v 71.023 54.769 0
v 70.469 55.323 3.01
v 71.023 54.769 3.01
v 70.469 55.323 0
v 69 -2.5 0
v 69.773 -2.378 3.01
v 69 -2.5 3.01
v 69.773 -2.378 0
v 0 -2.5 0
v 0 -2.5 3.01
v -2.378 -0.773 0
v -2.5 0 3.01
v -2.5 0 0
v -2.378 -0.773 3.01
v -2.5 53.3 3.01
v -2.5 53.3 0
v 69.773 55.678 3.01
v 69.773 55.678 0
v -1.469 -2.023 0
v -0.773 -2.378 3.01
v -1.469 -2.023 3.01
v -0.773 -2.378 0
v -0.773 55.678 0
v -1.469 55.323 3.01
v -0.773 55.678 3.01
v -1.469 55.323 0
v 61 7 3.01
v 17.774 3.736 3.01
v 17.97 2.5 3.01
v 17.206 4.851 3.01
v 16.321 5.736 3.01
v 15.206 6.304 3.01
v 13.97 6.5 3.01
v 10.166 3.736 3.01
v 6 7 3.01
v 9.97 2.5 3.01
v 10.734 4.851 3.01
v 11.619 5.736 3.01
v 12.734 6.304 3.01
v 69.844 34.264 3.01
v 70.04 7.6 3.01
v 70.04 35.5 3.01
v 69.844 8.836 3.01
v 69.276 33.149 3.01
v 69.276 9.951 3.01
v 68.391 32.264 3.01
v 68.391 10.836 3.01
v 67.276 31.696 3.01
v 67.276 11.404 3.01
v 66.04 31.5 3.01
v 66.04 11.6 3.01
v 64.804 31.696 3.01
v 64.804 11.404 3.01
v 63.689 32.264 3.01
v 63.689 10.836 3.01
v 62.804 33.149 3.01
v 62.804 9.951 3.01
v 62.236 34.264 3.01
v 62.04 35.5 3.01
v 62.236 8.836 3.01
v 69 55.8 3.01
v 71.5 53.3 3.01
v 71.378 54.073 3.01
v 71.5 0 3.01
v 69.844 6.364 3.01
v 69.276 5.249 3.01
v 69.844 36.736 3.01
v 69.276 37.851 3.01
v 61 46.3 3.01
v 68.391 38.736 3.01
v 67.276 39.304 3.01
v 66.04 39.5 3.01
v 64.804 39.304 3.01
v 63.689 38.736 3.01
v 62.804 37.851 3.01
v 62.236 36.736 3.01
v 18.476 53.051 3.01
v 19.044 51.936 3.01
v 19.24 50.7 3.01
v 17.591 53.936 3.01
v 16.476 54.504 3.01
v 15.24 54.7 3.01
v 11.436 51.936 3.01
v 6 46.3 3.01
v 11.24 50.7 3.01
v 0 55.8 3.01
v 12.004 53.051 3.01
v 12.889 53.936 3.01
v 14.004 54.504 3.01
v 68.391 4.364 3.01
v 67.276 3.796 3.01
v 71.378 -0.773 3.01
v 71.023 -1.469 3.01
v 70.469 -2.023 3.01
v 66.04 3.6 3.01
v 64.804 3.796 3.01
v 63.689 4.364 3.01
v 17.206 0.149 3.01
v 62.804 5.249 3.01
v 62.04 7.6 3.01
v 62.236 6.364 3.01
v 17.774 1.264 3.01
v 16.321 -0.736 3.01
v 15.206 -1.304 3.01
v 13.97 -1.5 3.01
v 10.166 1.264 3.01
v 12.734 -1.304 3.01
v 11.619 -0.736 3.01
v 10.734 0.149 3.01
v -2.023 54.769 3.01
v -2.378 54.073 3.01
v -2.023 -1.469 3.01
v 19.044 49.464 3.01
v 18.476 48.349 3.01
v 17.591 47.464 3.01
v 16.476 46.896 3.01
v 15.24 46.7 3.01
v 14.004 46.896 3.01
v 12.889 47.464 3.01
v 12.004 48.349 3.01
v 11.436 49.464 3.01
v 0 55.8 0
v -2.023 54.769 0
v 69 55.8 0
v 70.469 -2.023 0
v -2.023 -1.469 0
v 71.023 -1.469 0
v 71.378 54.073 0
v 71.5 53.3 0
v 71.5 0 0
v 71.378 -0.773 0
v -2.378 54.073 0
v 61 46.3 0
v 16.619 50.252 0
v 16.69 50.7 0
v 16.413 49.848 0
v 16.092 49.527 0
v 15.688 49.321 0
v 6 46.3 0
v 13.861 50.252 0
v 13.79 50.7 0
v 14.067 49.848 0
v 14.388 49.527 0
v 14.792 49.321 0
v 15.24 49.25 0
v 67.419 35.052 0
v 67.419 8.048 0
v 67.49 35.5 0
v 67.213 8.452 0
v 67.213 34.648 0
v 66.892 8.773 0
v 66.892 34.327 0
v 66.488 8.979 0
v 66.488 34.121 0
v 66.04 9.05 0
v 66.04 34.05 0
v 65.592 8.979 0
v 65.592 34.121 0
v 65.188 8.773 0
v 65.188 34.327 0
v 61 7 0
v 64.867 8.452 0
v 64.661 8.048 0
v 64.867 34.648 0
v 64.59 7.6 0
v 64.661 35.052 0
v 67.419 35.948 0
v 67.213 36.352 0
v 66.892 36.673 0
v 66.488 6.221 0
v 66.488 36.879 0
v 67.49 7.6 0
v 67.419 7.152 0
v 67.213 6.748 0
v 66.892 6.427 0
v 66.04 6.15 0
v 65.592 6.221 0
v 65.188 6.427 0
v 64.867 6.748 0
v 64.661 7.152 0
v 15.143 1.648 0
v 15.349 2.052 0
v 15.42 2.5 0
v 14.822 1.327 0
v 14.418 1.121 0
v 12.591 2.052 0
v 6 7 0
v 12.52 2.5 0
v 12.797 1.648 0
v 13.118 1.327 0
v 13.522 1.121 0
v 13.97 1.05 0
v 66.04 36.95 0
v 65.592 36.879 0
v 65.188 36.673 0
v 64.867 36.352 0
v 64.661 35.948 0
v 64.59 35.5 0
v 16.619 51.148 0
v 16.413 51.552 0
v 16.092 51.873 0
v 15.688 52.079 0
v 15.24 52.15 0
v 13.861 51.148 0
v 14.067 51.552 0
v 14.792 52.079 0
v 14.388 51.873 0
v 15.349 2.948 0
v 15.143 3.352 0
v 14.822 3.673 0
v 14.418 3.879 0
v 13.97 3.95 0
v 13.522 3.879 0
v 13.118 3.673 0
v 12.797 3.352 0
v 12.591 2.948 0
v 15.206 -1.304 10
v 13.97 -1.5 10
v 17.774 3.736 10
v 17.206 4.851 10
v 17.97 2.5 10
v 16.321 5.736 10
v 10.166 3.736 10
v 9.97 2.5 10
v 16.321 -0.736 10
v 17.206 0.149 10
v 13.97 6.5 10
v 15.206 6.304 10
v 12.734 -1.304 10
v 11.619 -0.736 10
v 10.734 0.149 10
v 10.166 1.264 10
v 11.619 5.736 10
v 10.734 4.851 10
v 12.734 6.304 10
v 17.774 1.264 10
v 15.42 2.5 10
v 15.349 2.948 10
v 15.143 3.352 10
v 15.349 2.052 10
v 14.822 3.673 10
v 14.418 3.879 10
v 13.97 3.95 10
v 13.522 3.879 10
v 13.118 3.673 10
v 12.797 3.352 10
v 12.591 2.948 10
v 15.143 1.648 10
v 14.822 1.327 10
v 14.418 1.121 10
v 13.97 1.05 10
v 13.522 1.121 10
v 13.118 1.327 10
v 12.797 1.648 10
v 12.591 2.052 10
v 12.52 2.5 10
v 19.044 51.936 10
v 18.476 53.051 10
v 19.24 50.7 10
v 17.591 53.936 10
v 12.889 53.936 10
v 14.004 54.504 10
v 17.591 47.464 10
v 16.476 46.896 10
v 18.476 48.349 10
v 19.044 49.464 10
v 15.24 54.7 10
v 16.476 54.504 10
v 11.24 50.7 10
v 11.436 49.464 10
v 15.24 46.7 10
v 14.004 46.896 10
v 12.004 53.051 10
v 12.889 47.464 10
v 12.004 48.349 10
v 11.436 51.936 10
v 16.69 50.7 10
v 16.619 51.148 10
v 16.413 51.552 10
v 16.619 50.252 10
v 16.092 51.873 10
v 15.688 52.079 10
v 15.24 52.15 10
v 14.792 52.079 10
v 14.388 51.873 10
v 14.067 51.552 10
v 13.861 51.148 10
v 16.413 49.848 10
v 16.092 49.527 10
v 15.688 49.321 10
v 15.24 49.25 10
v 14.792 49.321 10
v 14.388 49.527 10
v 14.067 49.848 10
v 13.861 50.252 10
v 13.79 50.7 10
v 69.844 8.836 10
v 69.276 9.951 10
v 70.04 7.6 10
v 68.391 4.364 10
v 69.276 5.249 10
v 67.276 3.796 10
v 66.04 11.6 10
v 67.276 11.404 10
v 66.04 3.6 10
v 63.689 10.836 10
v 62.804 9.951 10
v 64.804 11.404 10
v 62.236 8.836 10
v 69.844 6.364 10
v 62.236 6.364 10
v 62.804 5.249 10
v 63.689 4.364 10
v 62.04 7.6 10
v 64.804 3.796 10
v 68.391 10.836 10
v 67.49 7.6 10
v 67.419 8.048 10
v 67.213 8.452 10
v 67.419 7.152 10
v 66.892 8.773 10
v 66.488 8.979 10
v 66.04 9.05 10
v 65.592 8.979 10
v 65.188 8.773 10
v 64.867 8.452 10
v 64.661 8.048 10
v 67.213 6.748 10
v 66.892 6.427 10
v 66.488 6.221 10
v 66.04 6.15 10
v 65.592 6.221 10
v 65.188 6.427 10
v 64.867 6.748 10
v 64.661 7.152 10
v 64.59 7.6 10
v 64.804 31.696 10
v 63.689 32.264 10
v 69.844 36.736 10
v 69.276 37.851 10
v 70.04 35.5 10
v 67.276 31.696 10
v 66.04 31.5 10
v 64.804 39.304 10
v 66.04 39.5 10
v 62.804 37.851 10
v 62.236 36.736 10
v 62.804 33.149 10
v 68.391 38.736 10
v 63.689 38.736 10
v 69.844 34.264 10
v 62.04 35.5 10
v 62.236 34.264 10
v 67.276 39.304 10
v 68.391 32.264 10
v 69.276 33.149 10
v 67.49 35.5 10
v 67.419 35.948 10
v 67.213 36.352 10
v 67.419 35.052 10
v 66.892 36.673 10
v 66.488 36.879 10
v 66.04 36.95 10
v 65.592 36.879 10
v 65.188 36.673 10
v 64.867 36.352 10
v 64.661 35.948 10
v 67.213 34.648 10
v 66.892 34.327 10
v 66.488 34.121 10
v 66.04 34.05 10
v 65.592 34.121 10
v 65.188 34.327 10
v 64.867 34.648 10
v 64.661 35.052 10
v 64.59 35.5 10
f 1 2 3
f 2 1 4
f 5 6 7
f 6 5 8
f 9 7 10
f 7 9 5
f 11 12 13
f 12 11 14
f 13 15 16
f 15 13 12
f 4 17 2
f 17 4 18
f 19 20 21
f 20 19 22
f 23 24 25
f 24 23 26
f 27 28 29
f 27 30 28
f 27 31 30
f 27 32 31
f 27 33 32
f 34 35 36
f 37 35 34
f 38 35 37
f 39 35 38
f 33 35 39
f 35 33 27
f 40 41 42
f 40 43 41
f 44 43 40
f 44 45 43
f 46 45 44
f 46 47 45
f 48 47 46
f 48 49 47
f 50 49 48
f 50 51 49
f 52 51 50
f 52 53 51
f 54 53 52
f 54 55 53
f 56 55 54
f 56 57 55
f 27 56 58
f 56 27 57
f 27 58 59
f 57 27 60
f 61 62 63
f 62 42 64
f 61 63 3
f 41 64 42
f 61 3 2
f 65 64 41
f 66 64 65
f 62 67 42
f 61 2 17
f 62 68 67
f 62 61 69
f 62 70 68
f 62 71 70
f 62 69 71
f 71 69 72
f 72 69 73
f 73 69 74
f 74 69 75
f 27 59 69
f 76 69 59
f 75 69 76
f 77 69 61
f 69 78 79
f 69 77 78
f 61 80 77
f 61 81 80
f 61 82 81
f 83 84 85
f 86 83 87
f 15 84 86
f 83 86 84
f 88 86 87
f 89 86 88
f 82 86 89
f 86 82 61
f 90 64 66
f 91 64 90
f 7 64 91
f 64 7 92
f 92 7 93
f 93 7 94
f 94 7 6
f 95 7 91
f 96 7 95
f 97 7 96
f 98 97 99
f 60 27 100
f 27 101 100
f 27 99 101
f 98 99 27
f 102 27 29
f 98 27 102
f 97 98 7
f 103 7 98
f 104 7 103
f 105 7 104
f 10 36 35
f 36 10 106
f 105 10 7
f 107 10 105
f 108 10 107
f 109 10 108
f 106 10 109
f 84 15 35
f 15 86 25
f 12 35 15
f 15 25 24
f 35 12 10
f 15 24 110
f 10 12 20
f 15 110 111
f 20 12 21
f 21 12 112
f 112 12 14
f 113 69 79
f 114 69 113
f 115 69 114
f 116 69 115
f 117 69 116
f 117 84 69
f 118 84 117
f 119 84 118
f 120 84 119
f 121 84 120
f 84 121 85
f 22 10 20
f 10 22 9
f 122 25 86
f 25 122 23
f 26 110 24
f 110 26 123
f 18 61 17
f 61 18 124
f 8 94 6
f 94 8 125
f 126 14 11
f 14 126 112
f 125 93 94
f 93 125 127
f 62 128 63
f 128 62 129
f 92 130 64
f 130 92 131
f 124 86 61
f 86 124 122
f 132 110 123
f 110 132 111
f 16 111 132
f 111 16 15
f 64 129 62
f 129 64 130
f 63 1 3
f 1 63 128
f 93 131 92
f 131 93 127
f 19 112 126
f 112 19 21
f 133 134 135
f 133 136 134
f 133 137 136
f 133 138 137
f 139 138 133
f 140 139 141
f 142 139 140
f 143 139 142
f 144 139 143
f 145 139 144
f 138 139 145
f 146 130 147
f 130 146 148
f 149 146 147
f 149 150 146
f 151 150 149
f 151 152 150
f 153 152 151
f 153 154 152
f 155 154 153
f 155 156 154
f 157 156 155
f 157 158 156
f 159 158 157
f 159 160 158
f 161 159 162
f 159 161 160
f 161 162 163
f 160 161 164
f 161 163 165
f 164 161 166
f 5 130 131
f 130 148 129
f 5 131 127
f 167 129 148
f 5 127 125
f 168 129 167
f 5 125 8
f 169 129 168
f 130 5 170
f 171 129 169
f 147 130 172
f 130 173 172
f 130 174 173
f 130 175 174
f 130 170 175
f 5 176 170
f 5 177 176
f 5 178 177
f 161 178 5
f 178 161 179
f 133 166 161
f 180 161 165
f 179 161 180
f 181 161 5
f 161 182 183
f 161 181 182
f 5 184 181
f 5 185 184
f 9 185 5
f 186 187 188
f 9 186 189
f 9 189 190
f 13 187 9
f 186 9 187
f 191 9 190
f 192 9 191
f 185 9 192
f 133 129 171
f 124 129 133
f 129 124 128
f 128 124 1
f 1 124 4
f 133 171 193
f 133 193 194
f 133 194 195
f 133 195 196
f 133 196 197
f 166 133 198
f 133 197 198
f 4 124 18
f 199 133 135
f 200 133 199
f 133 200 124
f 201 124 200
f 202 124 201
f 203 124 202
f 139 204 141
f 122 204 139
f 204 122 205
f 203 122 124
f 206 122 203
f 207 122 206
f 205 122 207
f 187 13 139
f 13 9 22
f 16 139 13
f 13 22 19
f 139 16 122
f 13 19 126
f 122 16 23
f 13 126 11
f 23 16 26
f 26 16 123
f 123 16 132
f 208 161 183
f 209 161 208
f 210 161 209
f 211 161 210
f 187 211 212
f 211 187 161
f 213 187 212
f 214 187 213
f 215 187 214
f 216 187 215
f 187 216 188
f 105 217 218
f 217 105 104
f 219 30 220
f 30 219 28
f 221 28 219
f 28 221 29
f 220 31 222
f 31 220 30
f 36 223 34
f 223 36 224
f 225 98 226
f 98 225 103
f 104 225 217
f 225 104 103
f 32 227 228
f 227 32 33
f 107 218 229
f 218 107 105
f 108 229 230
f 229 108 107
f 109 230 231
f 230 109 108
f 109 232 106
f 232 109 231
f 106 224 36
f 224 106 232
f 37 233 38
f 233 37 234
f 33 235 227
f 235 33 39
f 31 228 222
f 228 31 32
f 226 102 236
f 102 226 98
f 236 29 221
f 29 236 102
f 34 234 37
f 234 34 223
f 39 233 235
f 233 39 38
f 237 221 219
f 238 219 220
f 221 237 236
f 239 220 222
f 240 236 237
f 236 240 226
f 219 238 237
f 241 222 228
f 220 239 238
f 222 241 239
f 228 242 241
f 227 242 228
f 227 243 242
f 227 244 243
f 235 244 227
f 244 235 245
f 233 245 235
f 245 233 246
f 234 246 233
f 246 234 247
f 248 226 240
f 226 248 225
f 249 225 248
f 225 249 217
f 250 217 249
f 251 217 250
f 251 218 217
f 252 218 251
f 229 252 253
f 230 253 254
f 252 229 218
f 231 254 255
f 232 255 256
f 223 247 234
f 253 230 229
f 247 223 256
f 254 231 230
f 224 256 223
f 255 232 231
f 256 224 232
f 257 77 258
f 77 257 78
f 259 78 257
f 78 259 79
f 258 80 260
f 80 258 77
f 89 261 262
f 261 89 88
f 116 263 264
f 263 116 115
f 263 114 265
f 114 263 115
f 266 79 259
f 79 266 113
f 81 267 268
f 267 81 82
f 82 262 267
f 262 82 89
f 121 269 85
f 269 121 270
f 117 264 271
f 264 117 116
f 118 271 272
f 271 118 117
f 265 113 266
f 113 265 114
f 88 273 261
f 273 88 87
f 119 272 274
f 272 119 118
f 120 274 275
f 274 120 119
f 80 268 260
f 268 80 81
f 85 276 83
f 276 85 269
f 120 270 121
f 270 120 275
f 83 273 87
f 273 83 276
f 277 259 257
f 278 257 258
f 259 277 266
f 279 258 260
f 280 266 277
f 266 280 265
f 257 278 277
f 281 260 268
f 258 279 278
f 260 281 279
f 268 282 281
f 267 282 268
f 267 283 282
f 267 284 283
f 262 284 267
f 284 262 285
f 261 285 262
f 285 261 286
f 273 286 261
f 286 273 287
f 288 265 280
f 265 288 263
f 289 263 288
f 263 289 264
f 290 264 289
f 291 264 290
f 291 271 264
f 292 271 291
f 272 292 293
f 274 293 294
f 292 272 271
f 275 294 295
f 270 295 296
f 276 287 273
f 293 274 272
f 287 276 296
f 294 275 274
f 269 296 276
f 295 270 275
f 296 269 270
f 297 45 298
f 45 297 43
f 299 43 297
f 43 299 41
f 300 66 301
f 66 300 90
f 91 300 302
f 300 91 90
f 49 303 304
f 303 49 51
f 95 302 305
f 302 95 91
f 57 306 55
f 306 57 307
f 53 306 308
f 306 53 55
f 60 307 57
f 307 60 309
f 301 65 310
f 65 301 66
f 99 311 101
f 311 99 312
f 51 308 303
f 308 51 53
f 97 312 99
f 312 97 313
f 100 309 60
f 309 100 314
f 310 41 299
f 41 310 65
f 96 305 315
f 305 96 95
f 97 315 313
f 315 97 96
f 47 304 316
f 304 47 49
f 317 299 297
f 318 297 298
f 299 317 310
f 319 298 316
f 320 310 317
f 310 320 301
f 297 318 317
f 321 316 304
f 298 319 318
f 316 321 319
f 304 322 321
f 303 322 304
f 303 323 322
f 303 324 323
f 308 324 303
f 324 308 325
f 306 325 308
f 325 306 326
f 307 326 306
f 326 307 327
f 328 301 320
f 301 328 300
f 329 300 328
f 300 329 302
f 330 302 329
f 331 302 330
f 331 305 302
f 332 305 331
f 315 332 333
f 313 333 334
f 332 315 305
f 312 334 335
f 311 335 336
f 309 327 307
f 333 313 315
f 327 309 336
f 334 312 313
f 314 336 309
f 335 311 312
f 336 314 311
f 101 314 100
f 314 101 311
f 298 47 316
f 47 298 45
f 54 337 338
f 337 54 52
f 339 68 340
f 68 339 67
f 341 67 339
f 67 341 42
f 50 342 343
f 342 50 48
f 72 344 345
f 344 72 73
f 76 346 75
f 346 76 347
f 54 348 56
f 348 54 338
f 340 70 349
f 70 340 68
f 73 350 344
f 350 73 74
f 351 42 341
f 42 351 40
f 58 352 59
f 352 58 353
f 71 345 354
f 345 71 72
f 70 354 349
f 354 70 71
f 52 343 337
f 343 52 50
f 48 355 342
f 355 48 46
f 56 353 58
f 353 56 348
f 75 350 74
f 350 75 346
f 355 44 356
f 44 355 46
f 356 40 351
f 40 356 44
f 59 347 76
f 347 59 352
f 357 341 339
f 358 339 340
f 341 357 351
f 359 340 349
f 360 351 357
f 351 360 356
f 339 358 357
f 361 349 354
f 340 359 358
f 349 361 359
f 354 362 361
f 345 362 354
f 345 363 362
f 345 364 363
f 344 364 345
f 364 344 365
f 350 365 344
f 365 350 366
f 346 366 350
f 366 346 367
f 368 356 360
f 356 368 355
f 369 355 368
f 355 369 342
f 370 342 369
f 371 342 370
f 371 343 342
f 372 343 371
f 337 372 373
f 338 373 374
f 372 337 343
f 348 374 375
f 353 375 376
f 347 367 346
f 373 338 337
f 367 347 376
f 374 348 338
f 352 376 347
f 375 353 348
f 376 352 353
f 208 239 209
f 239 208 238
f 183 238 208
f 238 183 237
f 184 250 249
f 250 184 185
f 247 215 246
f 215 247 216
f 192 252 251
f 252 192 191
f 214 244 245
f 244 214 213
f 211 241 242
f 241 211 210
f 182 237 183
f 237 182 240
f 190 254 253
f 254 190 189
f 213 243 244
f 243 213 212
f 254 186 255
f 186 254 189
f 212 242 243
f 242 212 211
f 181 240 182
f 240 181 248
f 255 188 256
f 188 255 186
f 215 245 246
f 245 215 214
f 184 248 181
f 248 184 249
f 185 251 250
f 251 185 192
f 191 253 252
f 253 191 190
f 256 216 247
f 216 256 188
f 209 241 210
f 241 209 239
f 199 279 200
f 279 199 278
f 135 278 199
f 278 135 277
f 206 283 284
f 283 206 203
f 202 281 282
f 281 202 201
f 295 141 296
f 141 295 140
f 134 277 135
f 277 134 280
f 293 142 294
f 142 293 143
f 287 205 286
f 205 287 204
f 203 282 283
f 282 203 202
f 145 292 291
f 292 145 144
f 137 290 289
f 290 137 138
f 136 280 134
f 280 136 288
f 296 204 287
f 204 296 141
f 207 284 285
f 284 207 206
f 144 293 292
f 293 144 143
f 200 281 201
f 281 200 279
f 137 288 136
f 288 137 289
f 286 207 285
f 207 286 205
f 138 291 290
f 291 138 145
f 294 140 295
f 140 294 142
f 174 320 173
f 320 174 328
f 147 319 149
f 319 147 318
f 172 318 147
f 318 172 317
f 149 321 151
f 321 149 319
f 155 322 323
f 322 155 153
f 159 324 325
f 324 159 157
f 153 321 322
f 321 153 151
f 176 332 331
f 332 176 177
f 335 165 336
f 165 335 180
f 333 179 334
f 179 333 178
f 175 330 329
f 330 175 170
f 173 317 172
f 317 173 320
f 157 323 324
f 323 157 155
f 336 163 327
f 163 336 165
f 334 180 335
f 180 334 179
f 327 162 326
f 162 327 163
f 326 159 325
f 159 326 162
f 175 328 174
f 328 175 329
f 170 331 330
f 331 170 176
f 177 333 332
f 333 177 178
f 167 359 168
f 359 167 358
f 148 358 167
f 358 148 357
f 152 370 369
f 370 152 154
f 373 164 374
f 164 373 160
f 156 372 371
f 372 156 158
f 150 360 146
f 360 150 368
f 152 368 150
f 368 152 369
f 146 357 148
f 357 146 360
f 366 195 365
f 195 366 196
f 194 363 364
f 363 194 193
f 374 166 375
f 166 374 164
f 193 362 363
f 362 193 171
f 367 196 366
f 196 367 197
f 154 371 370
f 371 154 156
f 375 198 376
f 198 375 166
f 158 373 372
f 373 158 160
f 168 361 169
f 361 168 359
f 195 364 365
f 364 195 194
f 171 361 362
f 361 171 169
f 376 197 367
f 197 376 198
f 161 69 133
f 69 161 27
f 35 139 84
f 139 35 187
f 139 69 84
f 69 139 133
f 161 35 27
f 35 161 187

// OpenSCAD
$fn=20;
difference(){
union(){
minkowski(){
    cube([69,53.3,3]);
    cylinder(d=5,h=0.01);
}
translate([13.97,2.5,0])cylinder(d=8,h=10);
translate([15.24,50.7,0])cylinder(d=8,h=10);
translate([66.04,7.6,0])cylinder(d=8,h=10);
translate([66.04,35.5,0])cylinder(d=8,h=10);
}
translate([13.97,2.5,0])cylinder(d=2.9,h=10);
translate([15.24,50.7,0])cylinder(d=2.9,h=10);
translate([66.04,7.6,0])cylinder(d=2.9,h=10);
translate([66.04,35.5,0])cylinder(d=2.9,h=10);
translate([6,7,-1])cube([55,39.3,5]);
}
